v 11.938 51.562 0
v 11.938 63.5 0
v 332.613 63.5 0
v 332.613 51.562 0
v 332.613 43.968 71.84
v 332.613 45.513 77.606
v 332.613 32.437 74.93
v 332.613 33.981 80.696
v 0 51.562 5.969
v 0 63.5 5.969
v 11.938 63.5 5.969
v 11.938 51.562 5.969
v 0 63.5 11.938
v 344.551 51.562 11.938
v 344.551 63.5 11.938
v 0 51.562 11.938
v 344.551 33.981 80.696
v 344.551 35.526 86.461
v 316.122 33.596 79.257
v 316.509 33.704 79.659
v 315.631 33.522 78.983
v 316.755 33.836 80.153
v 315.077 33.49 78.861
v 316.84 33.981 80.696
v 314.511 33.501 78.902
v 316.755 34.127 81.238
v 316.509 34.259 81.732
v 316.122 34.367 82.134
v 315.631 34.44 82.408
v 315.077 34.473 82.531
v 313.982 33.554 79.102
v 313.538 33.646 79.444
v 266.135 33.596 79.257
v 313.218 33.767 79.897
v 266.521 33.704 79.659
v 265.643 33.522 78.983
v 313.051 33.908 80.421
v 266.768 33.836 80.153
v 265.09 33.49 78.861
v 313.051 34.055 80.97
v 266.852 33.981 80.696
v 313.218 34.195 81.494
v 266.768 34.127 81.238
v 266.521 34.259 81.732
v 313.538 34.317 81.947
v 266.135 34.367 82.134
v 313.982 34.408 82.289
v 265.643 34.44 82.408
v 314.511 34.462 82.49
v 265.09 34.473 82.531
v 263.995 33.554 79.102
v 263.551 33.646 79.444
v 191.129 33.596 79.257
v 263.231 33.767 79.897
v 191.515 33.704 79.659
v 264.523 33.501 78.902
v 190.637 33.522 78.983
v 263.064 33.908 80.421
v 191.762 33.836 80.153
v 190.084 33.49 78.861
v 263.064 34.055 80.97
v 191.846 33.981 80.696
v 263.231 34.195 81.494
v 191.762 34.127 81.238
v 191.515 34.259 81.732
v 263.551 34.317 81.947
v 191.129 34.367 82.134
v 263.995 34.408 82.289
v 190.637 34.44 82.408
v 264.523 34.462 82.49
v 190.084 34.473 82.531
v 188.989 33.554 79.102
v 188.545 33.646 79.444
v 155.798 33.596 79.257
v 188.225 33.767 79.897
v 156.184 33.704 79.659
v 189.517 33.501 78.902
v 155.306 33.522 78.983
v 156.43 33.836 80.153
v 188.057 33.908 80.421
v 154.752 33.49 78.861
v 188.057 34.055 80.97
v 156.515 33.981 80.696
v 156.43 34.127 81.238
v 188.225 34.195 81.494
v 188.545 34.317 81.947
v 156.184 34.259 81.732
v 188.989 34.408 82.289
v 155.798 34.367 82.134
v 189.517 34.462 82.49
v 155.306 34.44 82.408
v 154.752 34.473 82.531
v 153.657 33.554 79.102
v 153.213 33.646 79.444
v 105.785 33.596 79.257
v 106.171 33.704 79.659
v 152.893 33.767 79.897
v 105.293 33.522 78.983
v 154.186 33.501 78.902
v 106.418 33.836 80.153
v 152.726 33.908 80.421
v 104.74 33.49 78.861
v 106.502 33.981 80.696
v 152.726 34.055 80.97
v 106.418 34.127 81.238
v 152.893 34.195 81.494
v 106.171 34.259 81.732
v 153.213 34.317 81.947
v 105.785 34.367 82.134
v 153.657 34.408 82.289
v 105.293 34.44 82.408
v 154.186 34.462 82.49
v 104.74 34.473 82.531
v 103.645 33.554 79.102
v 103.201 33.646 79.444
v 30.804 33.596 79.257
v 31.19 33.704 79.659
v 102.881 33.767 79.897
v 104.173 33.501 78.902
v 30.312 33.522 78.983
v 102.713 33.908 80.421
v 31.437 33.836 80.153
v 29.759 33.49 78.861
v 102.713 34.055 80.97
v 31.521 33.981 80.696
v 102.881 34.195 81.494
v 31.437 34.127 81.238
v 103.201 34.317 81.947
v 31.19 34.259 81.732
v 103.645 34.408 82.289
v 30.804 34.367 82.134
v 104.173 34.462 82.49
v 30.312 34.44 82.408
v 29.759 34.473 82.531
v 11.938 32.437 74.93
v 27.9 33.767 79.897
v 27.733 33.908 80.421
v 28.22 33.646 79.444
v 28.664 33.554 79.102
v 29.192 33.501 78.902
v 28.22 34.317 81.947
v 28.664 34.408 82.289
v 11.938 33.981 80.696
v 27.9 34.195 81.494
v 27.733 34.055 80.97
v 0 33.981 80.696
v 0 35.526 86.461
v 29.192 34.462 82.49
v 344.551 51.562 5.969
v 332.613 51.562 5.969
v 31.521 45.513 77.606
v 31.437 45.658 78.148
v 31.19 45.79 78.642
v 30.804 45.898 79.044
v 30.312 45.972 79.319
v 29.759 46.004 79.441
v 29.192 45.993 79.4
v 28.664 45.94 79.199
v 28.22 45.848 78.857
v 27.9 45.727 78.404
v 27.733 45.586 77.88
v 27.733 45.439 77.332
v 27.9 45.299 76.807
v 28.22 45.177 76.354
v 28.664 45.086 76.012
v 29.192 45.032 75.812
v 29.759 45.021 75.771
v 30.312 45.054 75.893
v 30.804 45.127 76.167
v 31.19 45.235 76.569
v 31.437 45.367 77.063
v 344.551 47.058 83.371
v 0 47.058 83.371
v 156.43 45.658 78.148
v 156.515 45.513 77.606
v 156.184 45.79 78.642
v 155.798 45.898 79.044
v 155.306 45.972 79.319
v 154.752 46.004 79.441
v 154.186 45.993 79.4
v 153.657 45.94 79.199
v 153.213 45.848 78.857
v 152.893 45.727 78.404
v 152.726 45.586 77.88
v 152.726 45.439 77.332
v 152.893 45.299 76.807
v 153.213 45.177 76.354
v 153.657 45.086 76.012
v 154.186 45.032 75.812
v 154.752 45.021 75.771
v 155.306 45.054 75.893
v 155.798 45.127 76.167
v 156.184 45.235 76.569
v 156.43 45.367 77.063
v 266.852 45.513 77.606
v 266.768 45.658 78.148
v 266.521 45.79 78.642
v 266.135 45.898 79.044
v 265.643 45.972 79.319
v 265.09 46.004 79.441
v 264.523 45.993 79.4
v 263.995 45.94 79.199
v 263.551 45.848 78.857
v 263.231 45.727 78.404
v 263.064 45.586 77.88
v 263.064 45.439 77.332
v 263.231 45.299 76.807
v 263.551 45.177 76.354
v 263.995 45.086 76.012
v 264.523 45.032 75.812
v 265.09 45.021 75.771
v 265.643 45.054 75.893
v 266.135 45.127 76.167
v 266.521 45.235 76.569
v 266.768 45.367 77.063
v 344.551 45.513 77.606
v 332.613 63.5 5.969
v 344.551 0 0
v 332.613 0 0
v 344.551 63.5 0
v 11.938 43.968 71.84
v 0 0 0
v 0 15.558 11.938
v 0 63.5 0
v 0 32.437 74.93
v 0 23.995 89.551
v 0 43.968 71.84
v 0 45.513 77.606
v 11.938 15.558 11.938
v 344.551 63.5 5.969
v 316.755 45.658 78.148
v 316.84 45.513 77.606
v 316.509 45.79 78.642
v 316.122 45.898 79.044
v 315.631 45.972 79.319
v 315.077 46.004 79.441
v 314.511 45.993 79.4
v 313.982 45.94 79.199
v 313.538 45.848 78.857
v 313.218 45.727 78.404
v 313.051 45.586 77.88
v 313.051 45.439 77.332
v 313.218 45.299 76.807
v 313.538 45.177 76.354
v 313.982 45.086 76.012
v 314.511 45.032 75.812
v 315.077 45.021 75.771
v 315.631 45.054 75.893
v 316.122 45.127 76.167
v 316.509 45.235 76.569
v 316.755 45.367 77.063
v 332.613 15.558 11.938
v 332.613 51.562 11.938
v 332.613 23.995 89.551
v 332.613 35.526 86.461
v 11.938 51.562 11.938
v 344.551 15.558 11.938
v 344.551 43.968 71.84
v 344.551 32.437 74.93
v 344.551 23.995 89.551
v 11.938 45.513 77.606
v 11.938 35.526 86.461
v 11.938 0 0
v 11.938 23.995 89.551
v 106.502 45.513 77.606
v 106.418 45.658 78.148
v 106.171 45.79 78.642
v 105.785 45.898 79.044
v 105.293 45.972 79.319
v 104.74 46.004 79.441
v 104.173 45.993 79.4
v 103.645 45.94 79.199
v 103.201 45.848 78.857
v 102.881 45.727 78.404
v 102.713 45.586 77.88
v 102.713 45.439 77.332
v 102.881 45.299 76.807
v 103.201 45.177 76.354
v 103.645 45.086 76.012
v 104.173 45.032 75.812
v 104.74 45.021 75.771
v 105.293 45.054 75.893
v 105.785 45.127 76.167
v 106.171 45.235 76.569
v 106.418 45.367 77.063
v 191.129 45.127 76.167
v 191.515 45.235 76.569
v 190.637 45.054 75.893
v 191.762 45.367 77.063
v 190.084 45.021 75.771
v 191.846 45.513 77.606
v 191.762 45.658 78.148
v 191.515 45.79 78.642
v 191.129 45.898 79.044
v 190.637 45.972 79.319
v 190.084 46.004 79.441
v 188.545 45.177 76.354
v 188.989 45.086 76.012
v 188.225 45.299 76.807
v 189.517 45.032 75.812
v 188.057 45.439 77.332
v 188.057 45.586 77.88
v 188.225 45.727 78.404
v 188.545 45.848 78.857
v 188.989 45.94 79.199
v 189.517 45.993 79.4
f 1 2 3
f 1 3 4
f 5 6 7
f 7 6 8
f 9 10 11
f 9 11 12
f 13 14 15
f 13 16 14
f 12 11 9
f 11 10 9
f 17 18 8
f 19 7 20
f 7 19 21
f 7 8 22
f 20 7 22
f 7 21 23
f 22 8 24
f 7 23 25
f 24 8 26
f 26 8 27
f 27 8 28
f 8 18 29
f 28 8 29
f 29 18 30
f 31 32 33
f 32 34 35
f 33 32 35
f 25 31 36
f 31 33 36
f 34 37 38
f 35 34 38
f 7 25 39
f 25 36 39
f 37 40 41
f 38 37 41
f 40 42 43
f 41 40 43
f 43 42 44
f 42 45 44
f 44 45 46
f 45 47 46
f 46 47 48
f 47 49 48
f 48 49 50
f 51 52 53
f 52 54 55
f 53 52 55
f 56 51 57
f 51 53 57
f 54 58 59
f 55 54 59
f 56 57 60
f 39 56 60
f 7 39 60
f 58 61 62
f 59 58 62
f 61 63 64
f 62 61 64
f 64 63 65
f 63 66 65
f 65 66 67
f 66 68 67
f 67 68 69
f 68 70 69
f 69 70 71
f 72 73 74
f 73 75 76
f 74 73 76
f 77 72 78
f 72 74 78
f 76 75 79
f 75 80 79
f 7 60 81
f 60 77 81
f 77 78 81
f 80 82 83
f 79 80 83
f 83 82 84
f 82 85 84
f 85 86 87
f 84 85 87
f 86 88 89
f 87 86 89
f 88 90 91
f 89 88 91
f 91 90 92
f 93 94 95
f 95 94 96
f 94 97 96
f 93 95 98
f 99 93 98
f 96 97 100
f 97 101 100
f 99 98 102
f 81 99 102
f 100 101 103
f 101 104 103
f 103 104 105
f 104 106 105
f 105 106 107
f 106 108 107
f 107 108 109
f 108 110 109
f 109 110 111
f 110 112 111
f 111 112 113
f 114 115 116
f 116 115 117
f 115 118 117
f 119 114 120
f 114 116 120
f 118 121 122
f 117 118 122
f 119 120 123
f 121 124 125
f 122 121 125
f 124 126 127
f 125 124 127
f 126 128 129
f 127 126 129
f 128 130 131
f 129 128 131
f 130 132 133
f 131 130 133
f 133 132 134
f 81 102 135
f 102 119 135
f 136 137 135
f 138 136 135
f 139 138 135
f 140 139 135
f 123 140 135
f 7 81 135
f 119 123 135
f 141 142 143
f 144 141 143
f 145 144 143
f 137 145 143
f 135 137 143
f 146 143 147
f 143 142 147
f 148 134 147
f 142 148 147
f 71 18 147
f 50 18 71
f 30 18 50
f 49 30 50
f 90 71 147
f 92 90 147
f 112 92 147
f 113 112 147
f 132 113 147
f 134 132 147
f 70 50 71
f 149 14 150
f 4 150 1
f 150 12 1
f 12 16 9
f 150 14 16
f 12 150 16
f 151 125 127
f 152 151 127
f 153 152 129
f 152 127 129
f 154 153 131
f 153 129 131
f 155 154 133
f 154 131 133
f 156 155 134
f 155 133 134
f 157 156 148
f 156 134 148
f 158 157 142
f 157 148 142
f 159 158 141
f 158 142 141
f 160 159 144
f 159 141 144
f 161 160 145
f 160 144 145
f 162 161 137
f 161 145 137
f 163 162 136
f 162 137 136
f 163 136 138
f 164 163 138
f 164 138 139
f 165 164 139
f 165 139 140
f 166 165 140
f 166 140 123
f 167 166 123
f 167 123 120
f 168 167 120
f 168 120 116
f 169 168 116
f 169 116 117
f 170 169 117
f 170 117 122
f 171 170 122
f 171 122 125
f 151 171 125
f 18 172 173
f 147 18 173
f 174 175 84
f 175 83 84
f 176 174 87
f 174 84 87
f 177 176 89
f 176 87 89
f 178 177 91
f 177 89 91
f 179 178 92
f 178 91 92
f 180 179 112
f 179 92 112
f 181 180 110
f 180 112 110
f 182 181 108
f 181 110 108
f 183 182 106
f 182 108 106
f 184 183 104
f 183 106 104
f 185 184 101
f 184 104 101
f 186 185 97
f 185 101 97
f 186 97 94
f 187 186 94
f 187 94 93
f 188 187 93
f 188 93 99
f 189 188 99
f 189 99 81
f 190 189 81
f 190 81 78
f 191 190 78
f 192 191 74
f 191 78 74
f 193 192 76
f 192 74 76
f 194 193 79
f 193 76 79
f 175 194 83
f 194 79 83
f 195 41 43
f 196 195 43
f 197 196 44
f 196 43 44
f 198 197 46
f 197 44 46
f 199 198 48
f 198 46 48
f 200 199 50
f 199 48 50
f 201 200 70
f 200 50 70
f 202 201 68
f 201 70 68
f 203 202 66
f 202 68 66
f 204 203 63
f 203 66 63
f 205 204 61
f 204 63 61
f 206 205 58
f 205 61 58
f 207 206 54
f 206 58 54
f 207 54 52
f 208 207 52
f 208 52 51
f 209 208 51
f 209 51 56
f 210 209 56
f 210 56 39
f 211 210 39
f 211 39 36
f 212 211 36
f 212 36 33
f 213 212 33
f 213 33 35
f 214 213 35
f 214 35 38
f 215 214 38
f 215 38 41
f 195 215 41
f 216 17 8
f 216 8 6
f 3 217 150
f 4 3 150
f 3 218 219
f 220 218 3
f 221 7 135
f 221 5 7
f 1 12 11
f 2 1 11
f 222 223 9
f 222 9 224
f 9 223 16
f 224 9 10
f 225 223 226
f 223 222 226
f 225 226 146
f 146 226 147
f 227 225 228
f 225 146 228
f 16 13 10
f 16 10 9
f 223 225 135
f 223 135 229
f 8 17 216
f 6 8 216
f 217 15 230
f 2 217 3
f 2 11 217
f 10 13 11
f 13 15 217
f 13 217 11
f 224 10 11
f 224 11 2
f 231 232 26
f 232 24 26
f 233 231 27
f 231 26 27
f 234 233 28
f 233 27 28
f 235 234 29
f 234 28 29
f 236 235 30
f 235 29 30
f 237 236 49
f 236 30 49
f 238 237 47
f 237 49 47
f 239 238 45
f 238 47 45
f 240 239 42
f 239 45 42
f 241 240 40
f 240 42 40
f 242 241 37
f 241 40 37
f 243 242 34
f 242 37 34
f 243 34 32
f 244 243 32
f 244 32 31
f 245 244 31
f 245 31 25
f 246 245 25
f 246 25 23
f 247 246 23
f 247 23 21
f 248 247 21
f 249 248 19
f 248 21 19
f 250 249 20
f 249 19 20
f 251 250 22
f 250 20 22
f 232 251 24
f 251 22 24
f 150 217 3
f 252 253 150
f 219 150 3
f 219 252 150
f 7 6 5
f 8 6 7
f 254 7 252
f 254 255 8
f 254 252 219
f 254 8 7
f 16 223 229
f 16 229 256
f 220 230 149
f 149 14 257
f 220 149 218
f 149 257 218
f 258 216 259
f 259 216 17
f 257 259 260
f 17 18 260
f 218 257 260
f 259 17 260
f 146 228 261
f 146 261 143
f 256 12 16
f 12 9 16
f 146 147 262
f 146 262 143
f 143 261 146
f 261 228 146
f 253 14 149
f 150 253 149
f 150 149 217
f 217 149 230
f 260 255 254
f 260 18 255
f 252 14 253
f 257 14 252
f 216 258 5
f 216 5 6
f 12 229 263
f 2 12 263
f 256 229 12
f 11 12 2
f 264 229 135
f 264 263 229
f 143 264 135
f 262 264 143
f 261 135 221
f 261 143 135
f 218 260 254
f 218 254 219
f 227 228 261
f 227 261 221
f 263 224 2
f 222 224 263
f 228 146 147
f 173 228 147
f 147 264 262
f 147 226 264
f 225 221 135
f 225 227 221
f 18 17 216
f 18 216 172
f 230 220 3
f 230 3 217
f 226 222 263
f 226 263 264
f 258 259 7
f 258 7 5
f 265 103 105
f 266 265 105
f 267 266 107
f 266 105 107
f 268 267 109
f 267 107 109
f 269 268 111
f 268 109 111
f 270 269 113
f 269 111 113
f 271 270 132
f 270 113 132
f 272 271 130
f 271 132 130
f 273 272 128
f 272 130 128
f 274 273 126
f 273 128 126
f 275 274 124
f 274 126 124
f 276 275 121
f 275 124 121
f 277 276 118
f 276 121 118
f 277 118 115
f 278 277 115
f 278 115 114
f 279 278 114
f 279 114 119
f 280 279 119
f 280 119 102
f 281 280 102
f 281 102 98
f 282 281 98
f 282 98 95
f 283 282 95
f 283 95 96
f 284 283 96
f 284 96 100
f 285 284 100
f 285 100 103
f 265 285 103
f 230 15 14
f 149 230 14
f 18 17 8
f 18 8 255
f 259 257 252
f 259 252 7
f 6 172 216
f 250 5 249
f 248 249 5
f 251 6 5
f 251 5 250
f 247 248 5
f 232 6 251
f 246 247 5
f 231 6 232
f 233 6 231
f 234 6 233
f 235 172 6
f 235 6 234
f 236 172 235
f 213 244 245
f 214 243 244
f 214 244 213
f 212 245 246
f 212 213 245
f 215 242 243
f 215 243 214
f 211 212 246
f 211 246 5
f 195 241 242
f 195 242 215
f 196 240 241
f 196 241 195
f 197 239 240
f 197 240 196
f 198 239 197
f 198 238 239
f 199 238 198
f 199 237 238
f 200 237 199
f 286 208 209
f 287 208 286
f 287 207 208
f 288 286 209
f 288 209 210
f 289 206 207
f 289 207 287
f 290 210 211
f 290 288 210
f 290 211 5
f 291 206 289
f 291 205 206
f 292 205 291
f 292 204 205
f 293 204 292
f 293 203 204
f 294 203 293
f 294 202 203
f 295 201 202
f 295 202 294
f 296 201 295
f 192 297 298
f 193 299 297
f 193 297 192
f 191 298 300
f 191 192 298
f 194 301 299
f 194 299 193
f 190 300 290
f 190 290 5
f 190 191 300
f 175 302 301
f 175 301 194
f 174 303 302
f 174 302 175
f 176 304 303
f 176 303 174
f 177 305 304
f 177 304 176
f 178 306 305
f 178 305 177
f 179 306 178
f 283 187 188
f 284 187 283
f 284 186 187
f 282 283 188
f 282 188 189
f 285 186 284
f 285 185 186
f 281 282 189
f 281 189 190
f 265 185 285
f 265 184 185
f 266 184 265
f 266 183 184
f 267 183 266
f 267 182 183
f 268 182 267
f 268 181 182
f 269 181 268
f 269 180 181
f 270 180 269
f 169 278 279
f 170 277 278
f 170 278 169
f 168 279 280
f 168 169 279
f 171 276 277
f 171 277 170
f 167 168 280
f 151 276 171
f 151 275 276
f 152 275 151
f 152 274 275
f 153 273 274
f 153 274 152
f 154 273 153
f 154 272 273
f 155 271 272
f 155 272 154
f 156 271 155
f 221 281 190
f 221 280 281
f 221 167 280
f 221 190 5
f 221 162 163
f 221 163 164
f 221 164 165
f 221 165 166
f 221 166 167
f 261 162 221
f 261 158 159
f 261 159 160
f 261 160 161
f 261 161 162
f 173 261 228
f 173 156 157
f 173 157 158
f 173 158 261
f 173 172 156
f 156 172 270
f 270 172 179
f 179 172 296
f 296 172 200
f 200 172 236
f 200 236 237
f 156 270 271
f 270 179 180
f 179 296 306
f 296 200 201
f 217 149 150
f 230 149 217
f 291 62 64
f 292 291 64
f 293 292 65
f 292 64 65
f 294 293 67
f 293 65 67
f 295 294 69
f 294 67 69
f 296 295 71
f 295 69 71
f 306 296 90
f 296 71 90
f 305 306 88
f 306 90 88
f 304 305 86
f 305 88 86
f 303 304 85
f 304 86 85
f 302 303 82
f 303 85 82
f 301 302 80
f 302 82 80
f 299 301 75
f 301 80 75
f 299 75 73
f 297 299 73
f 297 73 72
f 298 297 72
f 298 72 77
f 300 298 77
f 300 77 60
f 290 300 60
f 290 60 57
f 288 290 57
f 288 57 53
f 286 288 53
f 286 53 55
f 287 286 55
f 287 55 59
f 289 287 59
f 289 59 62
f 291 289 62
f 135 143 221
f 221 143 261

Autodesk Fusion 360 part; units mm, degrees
sketch "Sketch1" plane through (0, 0, 0) normal (1, 0, 0) x (0, 1, 0)
  line L0 (0, 0) -> (23.9951, 89.551)
  line L1 (23.9951, 89.551) -> (35.5263, 86.4612)
  line L2 (35.5263, 86.4612) -> (15.5579, 11.938)
  line L3 (15.5579, 11.938) -> (51.562, 11.938)
  line L4 (63.5, 5.969) -> (63.5, 0)
  line L5 (63.5, 0) -> (0, 0)
  line L6 (45.5127, 77.6058) -> (43.9678, 71.8402)
  line L7 (43.9678, 71.8402) -> (32.4366, 74.93)
  line L8 (45.5127, 77.6058) -> (33.9814, 80.6956)
  line L9 (63.5, 5.969) -> (51.562, 5.969)
  line L10 (51.562, 5.969) -> (51.562, 11.938)
  dimension "d9" = 92.71
  dimension "d10" = 11.938
  dimension "d11" = 75
  dimension "d13" = 63.5
  dimension "d24" = 11.938
  dimension "d25" = 5.969
  dimension "d26" = 5.969
  dimension "d27" = 11.938
  dimension "d28" = 5.969
  dimension "d29" = 36.0041
extrude "Extrude1" add sketch "Sketch1" along normal blind 11.938 makes body 1
sketch "Sketch3" plane through (0, 23.0624, -6.1796) normal (0, 0.9659, -0.2588) x (-1, 0, 0)
  line L0 (0, 80.772) -> (0, 86.741)
  line L1 (-11.938, 86.741) -> (-11.938, 80.772)
  line L2 (-11.938, 80.772) -> (0, 80.772)
  line L3 (0, 80.772) -> (-344.551, 80.772)
  line L4 (-344.551, 80.772) -> (-344.551, 92.71)
  line L5 (-344.551, 92.71) -> (0, 92.71)
  line L6 (0, 92.71) -> (0, 80.772)
  line L7 (0, 86.741) -> (-11.938, 86.741)
  dimension "d16" = 11.938
  dimension "d17" = 344.551
extrude "Extrude3" add sketch "Sketch3" against normal blind 11.938 separate body makes body 2
ref_plane "WorkPlane2" through (172.2755, 39.7471, 79.1507) normal (-1, 0, 0) x (0, -0.2588, -0.9659)
mirror "Mirror2" about plane through (172.2755, 39.7471, 79.1507) normal (-1, 0, 0) of bodies 1 makes body 3
sketch "Sketch4" plane through (0, 0, 0) normal (-1, 0, 0) x (0, -1, 0)
  line L0 (-43.9678, 71.8402) -> (-32.4366, 74.93)
  line L1 (-32.4366, 74.93) -> (-15.5579, 11.938)
  line L2 (-15.5579, 11.938) -> (-51.562, 11.938)
  line L3 (-51.562, 11.938) -> (-51.562, 5.969)
  line L4 (-51.562, 5.969) -> (-63.5, 5.969)
  line L5 (-63.5, 5.969) -> (-63.5, 0)
  line L6 (-63.5, 0) -> (0, 0)
  line L7 (0, 0) -> (-23.9951, 89.551)
  line L8 (-23.9951, 89.551) -> (-35.5263, 86.4612)
  line L9 (-35.5263, 86.4612) -> (-33.9814, 80.6956)
  line L10 (-33.9814, 80.6956) -> (-45.5127, 77.6058)
  line L11 (-45.5127, 77.6058) -> (-43.9678, 71.8402)
  line L12 (-63.5, 0) -> (-51.562, 0)
  line L13 (-51.562, 0) -> (-51.562, 11.938)
  line L14 (-51.562, 11.938) -> (-63.5, 11.938)
  line L15 (-63.5, 11.938) -> (-63.5, 0)
extrude "Extrude4" add sketch "Sketch4" against normal up to surface (344.551 mm away) separate body contours L3 L4 L13 L14 L15 | L4 L5 L6 L12 L13 L15 makes body 4
combine "Combine3" operation cut target body 2 tool bodies 1 3 keep tools
combine "Combine4" operation cut target body 4 tool bodies 1 3 keep tools
copy_body "Body->Comp9" bodies 1 removing the originals makes body 5 in component "Side1"
copy_body "Body->Comp10" bodies 2 removing the originals makes body 6 in component "TopStretcher"
copy_body "Body->Comp11" bodies 3 removing the originals makes body 7 in component "Side2"
copy_body "Body->Comp12" bodies 4 removing the originals makes body 8 in component "BottomStretcher"
sketch "Sketch5" plane through (0, 11.5312, -3.0898) normal (0, -0.9659, 0.2588) x (1, 0, 0)
  line L0 (344.551, 92.71) -> (0, 92.71)
  line L1 (0, 92.71) -> (0, 86.741)
  line L2 (0, 86.741) -> (11.938, 86.741)
  line L3 (11.938, 86.741) -> (11.938, 80.772)
  line L4 (11.938, 80.772) -> (332.613, 80.772)
  line L5 (332.613, 80.772) -> (332.613, 86.741)
  line L6 (332.613, 86.741) -> (344.551, 86.741)
  line L7 (344.551, 86.741) -> (344.551, 92.71)
  line L8 (11.938, 86.741) -> (332.613, 86.741) construction
  circle A0 centre (314.9346, 86.741) radius 1.905
  circle A1 centre (264.9474, 86.741) radius 1.905
  circle A2 centre (189.9412, 86.741) radius 1.905
  circle A3 centre (29.6164, 86.741) radius 1.905
  circle A4 centre (104.5972, 86.741) radius 1.905
  circle A5 centre (154.6098, 86.741) radius 1.905
  line L9 (11.938, 92.71) -> (11.938, 0)
  dimension "d32" = 3.81
  dimension "d33" = 3.81
  dimension "d34" = 3.81
  dimension "d35" = 17.6784
  dimension "d36" = 67.6656
  dimension "d37" = 142.6718
  dimension "d42" = 3.81
  dimension "d43" = 3.81
  dimension "d44" = 3.81
  dimension "d45" = 17.6784
  dimension "d46" = 92.6592
  dimension "d47" = 142.6718
extrude "Extrude1'" cut sketch "Sketch5" against normal through all contours A0 | A1 | A2 | A3 | A4 | A5 bodies 6 in component "TopStretcher"
component "Side1" placed x (1, 0, 0) y (0, 1, 0) z (0, 0, 1) at (0, 0, 0)
component "TopStretcher" placed x (1, 0, 0) y (0, 1, 0) z (0, 0, 1) at (0, 0, 0)
component "Side2" placed x (1, 0, 0) y (0, 1, 0) z (0, 0, 1) at (0, 0, 0)
component "BottomStretcher" placed x (1, 0, 0) y (0, 1, 0) z (0, 0, 1) at (0, 0, 0)
equation "PlyThin = 0.47 in"
equation "d2 = PlyThin"
equation "d9 = PanelHeight + 0.5 in"
equation "d10 = PlyThin"
equation "d16 = PlyThin"
equation "d17 = PanelWidth"
equation "PanelWidth = 2 * 6 5/16\" + 2 * PlyThin"
equation "PanelHeight = 3.15 in"
equation "d24 = PlyThin"
equation "d25 = PlyThin / 2"
equation "d26 = PlyThin / 2"
equation "d27 = PlyThin"
equation "d28 = PlyThin / 2"
